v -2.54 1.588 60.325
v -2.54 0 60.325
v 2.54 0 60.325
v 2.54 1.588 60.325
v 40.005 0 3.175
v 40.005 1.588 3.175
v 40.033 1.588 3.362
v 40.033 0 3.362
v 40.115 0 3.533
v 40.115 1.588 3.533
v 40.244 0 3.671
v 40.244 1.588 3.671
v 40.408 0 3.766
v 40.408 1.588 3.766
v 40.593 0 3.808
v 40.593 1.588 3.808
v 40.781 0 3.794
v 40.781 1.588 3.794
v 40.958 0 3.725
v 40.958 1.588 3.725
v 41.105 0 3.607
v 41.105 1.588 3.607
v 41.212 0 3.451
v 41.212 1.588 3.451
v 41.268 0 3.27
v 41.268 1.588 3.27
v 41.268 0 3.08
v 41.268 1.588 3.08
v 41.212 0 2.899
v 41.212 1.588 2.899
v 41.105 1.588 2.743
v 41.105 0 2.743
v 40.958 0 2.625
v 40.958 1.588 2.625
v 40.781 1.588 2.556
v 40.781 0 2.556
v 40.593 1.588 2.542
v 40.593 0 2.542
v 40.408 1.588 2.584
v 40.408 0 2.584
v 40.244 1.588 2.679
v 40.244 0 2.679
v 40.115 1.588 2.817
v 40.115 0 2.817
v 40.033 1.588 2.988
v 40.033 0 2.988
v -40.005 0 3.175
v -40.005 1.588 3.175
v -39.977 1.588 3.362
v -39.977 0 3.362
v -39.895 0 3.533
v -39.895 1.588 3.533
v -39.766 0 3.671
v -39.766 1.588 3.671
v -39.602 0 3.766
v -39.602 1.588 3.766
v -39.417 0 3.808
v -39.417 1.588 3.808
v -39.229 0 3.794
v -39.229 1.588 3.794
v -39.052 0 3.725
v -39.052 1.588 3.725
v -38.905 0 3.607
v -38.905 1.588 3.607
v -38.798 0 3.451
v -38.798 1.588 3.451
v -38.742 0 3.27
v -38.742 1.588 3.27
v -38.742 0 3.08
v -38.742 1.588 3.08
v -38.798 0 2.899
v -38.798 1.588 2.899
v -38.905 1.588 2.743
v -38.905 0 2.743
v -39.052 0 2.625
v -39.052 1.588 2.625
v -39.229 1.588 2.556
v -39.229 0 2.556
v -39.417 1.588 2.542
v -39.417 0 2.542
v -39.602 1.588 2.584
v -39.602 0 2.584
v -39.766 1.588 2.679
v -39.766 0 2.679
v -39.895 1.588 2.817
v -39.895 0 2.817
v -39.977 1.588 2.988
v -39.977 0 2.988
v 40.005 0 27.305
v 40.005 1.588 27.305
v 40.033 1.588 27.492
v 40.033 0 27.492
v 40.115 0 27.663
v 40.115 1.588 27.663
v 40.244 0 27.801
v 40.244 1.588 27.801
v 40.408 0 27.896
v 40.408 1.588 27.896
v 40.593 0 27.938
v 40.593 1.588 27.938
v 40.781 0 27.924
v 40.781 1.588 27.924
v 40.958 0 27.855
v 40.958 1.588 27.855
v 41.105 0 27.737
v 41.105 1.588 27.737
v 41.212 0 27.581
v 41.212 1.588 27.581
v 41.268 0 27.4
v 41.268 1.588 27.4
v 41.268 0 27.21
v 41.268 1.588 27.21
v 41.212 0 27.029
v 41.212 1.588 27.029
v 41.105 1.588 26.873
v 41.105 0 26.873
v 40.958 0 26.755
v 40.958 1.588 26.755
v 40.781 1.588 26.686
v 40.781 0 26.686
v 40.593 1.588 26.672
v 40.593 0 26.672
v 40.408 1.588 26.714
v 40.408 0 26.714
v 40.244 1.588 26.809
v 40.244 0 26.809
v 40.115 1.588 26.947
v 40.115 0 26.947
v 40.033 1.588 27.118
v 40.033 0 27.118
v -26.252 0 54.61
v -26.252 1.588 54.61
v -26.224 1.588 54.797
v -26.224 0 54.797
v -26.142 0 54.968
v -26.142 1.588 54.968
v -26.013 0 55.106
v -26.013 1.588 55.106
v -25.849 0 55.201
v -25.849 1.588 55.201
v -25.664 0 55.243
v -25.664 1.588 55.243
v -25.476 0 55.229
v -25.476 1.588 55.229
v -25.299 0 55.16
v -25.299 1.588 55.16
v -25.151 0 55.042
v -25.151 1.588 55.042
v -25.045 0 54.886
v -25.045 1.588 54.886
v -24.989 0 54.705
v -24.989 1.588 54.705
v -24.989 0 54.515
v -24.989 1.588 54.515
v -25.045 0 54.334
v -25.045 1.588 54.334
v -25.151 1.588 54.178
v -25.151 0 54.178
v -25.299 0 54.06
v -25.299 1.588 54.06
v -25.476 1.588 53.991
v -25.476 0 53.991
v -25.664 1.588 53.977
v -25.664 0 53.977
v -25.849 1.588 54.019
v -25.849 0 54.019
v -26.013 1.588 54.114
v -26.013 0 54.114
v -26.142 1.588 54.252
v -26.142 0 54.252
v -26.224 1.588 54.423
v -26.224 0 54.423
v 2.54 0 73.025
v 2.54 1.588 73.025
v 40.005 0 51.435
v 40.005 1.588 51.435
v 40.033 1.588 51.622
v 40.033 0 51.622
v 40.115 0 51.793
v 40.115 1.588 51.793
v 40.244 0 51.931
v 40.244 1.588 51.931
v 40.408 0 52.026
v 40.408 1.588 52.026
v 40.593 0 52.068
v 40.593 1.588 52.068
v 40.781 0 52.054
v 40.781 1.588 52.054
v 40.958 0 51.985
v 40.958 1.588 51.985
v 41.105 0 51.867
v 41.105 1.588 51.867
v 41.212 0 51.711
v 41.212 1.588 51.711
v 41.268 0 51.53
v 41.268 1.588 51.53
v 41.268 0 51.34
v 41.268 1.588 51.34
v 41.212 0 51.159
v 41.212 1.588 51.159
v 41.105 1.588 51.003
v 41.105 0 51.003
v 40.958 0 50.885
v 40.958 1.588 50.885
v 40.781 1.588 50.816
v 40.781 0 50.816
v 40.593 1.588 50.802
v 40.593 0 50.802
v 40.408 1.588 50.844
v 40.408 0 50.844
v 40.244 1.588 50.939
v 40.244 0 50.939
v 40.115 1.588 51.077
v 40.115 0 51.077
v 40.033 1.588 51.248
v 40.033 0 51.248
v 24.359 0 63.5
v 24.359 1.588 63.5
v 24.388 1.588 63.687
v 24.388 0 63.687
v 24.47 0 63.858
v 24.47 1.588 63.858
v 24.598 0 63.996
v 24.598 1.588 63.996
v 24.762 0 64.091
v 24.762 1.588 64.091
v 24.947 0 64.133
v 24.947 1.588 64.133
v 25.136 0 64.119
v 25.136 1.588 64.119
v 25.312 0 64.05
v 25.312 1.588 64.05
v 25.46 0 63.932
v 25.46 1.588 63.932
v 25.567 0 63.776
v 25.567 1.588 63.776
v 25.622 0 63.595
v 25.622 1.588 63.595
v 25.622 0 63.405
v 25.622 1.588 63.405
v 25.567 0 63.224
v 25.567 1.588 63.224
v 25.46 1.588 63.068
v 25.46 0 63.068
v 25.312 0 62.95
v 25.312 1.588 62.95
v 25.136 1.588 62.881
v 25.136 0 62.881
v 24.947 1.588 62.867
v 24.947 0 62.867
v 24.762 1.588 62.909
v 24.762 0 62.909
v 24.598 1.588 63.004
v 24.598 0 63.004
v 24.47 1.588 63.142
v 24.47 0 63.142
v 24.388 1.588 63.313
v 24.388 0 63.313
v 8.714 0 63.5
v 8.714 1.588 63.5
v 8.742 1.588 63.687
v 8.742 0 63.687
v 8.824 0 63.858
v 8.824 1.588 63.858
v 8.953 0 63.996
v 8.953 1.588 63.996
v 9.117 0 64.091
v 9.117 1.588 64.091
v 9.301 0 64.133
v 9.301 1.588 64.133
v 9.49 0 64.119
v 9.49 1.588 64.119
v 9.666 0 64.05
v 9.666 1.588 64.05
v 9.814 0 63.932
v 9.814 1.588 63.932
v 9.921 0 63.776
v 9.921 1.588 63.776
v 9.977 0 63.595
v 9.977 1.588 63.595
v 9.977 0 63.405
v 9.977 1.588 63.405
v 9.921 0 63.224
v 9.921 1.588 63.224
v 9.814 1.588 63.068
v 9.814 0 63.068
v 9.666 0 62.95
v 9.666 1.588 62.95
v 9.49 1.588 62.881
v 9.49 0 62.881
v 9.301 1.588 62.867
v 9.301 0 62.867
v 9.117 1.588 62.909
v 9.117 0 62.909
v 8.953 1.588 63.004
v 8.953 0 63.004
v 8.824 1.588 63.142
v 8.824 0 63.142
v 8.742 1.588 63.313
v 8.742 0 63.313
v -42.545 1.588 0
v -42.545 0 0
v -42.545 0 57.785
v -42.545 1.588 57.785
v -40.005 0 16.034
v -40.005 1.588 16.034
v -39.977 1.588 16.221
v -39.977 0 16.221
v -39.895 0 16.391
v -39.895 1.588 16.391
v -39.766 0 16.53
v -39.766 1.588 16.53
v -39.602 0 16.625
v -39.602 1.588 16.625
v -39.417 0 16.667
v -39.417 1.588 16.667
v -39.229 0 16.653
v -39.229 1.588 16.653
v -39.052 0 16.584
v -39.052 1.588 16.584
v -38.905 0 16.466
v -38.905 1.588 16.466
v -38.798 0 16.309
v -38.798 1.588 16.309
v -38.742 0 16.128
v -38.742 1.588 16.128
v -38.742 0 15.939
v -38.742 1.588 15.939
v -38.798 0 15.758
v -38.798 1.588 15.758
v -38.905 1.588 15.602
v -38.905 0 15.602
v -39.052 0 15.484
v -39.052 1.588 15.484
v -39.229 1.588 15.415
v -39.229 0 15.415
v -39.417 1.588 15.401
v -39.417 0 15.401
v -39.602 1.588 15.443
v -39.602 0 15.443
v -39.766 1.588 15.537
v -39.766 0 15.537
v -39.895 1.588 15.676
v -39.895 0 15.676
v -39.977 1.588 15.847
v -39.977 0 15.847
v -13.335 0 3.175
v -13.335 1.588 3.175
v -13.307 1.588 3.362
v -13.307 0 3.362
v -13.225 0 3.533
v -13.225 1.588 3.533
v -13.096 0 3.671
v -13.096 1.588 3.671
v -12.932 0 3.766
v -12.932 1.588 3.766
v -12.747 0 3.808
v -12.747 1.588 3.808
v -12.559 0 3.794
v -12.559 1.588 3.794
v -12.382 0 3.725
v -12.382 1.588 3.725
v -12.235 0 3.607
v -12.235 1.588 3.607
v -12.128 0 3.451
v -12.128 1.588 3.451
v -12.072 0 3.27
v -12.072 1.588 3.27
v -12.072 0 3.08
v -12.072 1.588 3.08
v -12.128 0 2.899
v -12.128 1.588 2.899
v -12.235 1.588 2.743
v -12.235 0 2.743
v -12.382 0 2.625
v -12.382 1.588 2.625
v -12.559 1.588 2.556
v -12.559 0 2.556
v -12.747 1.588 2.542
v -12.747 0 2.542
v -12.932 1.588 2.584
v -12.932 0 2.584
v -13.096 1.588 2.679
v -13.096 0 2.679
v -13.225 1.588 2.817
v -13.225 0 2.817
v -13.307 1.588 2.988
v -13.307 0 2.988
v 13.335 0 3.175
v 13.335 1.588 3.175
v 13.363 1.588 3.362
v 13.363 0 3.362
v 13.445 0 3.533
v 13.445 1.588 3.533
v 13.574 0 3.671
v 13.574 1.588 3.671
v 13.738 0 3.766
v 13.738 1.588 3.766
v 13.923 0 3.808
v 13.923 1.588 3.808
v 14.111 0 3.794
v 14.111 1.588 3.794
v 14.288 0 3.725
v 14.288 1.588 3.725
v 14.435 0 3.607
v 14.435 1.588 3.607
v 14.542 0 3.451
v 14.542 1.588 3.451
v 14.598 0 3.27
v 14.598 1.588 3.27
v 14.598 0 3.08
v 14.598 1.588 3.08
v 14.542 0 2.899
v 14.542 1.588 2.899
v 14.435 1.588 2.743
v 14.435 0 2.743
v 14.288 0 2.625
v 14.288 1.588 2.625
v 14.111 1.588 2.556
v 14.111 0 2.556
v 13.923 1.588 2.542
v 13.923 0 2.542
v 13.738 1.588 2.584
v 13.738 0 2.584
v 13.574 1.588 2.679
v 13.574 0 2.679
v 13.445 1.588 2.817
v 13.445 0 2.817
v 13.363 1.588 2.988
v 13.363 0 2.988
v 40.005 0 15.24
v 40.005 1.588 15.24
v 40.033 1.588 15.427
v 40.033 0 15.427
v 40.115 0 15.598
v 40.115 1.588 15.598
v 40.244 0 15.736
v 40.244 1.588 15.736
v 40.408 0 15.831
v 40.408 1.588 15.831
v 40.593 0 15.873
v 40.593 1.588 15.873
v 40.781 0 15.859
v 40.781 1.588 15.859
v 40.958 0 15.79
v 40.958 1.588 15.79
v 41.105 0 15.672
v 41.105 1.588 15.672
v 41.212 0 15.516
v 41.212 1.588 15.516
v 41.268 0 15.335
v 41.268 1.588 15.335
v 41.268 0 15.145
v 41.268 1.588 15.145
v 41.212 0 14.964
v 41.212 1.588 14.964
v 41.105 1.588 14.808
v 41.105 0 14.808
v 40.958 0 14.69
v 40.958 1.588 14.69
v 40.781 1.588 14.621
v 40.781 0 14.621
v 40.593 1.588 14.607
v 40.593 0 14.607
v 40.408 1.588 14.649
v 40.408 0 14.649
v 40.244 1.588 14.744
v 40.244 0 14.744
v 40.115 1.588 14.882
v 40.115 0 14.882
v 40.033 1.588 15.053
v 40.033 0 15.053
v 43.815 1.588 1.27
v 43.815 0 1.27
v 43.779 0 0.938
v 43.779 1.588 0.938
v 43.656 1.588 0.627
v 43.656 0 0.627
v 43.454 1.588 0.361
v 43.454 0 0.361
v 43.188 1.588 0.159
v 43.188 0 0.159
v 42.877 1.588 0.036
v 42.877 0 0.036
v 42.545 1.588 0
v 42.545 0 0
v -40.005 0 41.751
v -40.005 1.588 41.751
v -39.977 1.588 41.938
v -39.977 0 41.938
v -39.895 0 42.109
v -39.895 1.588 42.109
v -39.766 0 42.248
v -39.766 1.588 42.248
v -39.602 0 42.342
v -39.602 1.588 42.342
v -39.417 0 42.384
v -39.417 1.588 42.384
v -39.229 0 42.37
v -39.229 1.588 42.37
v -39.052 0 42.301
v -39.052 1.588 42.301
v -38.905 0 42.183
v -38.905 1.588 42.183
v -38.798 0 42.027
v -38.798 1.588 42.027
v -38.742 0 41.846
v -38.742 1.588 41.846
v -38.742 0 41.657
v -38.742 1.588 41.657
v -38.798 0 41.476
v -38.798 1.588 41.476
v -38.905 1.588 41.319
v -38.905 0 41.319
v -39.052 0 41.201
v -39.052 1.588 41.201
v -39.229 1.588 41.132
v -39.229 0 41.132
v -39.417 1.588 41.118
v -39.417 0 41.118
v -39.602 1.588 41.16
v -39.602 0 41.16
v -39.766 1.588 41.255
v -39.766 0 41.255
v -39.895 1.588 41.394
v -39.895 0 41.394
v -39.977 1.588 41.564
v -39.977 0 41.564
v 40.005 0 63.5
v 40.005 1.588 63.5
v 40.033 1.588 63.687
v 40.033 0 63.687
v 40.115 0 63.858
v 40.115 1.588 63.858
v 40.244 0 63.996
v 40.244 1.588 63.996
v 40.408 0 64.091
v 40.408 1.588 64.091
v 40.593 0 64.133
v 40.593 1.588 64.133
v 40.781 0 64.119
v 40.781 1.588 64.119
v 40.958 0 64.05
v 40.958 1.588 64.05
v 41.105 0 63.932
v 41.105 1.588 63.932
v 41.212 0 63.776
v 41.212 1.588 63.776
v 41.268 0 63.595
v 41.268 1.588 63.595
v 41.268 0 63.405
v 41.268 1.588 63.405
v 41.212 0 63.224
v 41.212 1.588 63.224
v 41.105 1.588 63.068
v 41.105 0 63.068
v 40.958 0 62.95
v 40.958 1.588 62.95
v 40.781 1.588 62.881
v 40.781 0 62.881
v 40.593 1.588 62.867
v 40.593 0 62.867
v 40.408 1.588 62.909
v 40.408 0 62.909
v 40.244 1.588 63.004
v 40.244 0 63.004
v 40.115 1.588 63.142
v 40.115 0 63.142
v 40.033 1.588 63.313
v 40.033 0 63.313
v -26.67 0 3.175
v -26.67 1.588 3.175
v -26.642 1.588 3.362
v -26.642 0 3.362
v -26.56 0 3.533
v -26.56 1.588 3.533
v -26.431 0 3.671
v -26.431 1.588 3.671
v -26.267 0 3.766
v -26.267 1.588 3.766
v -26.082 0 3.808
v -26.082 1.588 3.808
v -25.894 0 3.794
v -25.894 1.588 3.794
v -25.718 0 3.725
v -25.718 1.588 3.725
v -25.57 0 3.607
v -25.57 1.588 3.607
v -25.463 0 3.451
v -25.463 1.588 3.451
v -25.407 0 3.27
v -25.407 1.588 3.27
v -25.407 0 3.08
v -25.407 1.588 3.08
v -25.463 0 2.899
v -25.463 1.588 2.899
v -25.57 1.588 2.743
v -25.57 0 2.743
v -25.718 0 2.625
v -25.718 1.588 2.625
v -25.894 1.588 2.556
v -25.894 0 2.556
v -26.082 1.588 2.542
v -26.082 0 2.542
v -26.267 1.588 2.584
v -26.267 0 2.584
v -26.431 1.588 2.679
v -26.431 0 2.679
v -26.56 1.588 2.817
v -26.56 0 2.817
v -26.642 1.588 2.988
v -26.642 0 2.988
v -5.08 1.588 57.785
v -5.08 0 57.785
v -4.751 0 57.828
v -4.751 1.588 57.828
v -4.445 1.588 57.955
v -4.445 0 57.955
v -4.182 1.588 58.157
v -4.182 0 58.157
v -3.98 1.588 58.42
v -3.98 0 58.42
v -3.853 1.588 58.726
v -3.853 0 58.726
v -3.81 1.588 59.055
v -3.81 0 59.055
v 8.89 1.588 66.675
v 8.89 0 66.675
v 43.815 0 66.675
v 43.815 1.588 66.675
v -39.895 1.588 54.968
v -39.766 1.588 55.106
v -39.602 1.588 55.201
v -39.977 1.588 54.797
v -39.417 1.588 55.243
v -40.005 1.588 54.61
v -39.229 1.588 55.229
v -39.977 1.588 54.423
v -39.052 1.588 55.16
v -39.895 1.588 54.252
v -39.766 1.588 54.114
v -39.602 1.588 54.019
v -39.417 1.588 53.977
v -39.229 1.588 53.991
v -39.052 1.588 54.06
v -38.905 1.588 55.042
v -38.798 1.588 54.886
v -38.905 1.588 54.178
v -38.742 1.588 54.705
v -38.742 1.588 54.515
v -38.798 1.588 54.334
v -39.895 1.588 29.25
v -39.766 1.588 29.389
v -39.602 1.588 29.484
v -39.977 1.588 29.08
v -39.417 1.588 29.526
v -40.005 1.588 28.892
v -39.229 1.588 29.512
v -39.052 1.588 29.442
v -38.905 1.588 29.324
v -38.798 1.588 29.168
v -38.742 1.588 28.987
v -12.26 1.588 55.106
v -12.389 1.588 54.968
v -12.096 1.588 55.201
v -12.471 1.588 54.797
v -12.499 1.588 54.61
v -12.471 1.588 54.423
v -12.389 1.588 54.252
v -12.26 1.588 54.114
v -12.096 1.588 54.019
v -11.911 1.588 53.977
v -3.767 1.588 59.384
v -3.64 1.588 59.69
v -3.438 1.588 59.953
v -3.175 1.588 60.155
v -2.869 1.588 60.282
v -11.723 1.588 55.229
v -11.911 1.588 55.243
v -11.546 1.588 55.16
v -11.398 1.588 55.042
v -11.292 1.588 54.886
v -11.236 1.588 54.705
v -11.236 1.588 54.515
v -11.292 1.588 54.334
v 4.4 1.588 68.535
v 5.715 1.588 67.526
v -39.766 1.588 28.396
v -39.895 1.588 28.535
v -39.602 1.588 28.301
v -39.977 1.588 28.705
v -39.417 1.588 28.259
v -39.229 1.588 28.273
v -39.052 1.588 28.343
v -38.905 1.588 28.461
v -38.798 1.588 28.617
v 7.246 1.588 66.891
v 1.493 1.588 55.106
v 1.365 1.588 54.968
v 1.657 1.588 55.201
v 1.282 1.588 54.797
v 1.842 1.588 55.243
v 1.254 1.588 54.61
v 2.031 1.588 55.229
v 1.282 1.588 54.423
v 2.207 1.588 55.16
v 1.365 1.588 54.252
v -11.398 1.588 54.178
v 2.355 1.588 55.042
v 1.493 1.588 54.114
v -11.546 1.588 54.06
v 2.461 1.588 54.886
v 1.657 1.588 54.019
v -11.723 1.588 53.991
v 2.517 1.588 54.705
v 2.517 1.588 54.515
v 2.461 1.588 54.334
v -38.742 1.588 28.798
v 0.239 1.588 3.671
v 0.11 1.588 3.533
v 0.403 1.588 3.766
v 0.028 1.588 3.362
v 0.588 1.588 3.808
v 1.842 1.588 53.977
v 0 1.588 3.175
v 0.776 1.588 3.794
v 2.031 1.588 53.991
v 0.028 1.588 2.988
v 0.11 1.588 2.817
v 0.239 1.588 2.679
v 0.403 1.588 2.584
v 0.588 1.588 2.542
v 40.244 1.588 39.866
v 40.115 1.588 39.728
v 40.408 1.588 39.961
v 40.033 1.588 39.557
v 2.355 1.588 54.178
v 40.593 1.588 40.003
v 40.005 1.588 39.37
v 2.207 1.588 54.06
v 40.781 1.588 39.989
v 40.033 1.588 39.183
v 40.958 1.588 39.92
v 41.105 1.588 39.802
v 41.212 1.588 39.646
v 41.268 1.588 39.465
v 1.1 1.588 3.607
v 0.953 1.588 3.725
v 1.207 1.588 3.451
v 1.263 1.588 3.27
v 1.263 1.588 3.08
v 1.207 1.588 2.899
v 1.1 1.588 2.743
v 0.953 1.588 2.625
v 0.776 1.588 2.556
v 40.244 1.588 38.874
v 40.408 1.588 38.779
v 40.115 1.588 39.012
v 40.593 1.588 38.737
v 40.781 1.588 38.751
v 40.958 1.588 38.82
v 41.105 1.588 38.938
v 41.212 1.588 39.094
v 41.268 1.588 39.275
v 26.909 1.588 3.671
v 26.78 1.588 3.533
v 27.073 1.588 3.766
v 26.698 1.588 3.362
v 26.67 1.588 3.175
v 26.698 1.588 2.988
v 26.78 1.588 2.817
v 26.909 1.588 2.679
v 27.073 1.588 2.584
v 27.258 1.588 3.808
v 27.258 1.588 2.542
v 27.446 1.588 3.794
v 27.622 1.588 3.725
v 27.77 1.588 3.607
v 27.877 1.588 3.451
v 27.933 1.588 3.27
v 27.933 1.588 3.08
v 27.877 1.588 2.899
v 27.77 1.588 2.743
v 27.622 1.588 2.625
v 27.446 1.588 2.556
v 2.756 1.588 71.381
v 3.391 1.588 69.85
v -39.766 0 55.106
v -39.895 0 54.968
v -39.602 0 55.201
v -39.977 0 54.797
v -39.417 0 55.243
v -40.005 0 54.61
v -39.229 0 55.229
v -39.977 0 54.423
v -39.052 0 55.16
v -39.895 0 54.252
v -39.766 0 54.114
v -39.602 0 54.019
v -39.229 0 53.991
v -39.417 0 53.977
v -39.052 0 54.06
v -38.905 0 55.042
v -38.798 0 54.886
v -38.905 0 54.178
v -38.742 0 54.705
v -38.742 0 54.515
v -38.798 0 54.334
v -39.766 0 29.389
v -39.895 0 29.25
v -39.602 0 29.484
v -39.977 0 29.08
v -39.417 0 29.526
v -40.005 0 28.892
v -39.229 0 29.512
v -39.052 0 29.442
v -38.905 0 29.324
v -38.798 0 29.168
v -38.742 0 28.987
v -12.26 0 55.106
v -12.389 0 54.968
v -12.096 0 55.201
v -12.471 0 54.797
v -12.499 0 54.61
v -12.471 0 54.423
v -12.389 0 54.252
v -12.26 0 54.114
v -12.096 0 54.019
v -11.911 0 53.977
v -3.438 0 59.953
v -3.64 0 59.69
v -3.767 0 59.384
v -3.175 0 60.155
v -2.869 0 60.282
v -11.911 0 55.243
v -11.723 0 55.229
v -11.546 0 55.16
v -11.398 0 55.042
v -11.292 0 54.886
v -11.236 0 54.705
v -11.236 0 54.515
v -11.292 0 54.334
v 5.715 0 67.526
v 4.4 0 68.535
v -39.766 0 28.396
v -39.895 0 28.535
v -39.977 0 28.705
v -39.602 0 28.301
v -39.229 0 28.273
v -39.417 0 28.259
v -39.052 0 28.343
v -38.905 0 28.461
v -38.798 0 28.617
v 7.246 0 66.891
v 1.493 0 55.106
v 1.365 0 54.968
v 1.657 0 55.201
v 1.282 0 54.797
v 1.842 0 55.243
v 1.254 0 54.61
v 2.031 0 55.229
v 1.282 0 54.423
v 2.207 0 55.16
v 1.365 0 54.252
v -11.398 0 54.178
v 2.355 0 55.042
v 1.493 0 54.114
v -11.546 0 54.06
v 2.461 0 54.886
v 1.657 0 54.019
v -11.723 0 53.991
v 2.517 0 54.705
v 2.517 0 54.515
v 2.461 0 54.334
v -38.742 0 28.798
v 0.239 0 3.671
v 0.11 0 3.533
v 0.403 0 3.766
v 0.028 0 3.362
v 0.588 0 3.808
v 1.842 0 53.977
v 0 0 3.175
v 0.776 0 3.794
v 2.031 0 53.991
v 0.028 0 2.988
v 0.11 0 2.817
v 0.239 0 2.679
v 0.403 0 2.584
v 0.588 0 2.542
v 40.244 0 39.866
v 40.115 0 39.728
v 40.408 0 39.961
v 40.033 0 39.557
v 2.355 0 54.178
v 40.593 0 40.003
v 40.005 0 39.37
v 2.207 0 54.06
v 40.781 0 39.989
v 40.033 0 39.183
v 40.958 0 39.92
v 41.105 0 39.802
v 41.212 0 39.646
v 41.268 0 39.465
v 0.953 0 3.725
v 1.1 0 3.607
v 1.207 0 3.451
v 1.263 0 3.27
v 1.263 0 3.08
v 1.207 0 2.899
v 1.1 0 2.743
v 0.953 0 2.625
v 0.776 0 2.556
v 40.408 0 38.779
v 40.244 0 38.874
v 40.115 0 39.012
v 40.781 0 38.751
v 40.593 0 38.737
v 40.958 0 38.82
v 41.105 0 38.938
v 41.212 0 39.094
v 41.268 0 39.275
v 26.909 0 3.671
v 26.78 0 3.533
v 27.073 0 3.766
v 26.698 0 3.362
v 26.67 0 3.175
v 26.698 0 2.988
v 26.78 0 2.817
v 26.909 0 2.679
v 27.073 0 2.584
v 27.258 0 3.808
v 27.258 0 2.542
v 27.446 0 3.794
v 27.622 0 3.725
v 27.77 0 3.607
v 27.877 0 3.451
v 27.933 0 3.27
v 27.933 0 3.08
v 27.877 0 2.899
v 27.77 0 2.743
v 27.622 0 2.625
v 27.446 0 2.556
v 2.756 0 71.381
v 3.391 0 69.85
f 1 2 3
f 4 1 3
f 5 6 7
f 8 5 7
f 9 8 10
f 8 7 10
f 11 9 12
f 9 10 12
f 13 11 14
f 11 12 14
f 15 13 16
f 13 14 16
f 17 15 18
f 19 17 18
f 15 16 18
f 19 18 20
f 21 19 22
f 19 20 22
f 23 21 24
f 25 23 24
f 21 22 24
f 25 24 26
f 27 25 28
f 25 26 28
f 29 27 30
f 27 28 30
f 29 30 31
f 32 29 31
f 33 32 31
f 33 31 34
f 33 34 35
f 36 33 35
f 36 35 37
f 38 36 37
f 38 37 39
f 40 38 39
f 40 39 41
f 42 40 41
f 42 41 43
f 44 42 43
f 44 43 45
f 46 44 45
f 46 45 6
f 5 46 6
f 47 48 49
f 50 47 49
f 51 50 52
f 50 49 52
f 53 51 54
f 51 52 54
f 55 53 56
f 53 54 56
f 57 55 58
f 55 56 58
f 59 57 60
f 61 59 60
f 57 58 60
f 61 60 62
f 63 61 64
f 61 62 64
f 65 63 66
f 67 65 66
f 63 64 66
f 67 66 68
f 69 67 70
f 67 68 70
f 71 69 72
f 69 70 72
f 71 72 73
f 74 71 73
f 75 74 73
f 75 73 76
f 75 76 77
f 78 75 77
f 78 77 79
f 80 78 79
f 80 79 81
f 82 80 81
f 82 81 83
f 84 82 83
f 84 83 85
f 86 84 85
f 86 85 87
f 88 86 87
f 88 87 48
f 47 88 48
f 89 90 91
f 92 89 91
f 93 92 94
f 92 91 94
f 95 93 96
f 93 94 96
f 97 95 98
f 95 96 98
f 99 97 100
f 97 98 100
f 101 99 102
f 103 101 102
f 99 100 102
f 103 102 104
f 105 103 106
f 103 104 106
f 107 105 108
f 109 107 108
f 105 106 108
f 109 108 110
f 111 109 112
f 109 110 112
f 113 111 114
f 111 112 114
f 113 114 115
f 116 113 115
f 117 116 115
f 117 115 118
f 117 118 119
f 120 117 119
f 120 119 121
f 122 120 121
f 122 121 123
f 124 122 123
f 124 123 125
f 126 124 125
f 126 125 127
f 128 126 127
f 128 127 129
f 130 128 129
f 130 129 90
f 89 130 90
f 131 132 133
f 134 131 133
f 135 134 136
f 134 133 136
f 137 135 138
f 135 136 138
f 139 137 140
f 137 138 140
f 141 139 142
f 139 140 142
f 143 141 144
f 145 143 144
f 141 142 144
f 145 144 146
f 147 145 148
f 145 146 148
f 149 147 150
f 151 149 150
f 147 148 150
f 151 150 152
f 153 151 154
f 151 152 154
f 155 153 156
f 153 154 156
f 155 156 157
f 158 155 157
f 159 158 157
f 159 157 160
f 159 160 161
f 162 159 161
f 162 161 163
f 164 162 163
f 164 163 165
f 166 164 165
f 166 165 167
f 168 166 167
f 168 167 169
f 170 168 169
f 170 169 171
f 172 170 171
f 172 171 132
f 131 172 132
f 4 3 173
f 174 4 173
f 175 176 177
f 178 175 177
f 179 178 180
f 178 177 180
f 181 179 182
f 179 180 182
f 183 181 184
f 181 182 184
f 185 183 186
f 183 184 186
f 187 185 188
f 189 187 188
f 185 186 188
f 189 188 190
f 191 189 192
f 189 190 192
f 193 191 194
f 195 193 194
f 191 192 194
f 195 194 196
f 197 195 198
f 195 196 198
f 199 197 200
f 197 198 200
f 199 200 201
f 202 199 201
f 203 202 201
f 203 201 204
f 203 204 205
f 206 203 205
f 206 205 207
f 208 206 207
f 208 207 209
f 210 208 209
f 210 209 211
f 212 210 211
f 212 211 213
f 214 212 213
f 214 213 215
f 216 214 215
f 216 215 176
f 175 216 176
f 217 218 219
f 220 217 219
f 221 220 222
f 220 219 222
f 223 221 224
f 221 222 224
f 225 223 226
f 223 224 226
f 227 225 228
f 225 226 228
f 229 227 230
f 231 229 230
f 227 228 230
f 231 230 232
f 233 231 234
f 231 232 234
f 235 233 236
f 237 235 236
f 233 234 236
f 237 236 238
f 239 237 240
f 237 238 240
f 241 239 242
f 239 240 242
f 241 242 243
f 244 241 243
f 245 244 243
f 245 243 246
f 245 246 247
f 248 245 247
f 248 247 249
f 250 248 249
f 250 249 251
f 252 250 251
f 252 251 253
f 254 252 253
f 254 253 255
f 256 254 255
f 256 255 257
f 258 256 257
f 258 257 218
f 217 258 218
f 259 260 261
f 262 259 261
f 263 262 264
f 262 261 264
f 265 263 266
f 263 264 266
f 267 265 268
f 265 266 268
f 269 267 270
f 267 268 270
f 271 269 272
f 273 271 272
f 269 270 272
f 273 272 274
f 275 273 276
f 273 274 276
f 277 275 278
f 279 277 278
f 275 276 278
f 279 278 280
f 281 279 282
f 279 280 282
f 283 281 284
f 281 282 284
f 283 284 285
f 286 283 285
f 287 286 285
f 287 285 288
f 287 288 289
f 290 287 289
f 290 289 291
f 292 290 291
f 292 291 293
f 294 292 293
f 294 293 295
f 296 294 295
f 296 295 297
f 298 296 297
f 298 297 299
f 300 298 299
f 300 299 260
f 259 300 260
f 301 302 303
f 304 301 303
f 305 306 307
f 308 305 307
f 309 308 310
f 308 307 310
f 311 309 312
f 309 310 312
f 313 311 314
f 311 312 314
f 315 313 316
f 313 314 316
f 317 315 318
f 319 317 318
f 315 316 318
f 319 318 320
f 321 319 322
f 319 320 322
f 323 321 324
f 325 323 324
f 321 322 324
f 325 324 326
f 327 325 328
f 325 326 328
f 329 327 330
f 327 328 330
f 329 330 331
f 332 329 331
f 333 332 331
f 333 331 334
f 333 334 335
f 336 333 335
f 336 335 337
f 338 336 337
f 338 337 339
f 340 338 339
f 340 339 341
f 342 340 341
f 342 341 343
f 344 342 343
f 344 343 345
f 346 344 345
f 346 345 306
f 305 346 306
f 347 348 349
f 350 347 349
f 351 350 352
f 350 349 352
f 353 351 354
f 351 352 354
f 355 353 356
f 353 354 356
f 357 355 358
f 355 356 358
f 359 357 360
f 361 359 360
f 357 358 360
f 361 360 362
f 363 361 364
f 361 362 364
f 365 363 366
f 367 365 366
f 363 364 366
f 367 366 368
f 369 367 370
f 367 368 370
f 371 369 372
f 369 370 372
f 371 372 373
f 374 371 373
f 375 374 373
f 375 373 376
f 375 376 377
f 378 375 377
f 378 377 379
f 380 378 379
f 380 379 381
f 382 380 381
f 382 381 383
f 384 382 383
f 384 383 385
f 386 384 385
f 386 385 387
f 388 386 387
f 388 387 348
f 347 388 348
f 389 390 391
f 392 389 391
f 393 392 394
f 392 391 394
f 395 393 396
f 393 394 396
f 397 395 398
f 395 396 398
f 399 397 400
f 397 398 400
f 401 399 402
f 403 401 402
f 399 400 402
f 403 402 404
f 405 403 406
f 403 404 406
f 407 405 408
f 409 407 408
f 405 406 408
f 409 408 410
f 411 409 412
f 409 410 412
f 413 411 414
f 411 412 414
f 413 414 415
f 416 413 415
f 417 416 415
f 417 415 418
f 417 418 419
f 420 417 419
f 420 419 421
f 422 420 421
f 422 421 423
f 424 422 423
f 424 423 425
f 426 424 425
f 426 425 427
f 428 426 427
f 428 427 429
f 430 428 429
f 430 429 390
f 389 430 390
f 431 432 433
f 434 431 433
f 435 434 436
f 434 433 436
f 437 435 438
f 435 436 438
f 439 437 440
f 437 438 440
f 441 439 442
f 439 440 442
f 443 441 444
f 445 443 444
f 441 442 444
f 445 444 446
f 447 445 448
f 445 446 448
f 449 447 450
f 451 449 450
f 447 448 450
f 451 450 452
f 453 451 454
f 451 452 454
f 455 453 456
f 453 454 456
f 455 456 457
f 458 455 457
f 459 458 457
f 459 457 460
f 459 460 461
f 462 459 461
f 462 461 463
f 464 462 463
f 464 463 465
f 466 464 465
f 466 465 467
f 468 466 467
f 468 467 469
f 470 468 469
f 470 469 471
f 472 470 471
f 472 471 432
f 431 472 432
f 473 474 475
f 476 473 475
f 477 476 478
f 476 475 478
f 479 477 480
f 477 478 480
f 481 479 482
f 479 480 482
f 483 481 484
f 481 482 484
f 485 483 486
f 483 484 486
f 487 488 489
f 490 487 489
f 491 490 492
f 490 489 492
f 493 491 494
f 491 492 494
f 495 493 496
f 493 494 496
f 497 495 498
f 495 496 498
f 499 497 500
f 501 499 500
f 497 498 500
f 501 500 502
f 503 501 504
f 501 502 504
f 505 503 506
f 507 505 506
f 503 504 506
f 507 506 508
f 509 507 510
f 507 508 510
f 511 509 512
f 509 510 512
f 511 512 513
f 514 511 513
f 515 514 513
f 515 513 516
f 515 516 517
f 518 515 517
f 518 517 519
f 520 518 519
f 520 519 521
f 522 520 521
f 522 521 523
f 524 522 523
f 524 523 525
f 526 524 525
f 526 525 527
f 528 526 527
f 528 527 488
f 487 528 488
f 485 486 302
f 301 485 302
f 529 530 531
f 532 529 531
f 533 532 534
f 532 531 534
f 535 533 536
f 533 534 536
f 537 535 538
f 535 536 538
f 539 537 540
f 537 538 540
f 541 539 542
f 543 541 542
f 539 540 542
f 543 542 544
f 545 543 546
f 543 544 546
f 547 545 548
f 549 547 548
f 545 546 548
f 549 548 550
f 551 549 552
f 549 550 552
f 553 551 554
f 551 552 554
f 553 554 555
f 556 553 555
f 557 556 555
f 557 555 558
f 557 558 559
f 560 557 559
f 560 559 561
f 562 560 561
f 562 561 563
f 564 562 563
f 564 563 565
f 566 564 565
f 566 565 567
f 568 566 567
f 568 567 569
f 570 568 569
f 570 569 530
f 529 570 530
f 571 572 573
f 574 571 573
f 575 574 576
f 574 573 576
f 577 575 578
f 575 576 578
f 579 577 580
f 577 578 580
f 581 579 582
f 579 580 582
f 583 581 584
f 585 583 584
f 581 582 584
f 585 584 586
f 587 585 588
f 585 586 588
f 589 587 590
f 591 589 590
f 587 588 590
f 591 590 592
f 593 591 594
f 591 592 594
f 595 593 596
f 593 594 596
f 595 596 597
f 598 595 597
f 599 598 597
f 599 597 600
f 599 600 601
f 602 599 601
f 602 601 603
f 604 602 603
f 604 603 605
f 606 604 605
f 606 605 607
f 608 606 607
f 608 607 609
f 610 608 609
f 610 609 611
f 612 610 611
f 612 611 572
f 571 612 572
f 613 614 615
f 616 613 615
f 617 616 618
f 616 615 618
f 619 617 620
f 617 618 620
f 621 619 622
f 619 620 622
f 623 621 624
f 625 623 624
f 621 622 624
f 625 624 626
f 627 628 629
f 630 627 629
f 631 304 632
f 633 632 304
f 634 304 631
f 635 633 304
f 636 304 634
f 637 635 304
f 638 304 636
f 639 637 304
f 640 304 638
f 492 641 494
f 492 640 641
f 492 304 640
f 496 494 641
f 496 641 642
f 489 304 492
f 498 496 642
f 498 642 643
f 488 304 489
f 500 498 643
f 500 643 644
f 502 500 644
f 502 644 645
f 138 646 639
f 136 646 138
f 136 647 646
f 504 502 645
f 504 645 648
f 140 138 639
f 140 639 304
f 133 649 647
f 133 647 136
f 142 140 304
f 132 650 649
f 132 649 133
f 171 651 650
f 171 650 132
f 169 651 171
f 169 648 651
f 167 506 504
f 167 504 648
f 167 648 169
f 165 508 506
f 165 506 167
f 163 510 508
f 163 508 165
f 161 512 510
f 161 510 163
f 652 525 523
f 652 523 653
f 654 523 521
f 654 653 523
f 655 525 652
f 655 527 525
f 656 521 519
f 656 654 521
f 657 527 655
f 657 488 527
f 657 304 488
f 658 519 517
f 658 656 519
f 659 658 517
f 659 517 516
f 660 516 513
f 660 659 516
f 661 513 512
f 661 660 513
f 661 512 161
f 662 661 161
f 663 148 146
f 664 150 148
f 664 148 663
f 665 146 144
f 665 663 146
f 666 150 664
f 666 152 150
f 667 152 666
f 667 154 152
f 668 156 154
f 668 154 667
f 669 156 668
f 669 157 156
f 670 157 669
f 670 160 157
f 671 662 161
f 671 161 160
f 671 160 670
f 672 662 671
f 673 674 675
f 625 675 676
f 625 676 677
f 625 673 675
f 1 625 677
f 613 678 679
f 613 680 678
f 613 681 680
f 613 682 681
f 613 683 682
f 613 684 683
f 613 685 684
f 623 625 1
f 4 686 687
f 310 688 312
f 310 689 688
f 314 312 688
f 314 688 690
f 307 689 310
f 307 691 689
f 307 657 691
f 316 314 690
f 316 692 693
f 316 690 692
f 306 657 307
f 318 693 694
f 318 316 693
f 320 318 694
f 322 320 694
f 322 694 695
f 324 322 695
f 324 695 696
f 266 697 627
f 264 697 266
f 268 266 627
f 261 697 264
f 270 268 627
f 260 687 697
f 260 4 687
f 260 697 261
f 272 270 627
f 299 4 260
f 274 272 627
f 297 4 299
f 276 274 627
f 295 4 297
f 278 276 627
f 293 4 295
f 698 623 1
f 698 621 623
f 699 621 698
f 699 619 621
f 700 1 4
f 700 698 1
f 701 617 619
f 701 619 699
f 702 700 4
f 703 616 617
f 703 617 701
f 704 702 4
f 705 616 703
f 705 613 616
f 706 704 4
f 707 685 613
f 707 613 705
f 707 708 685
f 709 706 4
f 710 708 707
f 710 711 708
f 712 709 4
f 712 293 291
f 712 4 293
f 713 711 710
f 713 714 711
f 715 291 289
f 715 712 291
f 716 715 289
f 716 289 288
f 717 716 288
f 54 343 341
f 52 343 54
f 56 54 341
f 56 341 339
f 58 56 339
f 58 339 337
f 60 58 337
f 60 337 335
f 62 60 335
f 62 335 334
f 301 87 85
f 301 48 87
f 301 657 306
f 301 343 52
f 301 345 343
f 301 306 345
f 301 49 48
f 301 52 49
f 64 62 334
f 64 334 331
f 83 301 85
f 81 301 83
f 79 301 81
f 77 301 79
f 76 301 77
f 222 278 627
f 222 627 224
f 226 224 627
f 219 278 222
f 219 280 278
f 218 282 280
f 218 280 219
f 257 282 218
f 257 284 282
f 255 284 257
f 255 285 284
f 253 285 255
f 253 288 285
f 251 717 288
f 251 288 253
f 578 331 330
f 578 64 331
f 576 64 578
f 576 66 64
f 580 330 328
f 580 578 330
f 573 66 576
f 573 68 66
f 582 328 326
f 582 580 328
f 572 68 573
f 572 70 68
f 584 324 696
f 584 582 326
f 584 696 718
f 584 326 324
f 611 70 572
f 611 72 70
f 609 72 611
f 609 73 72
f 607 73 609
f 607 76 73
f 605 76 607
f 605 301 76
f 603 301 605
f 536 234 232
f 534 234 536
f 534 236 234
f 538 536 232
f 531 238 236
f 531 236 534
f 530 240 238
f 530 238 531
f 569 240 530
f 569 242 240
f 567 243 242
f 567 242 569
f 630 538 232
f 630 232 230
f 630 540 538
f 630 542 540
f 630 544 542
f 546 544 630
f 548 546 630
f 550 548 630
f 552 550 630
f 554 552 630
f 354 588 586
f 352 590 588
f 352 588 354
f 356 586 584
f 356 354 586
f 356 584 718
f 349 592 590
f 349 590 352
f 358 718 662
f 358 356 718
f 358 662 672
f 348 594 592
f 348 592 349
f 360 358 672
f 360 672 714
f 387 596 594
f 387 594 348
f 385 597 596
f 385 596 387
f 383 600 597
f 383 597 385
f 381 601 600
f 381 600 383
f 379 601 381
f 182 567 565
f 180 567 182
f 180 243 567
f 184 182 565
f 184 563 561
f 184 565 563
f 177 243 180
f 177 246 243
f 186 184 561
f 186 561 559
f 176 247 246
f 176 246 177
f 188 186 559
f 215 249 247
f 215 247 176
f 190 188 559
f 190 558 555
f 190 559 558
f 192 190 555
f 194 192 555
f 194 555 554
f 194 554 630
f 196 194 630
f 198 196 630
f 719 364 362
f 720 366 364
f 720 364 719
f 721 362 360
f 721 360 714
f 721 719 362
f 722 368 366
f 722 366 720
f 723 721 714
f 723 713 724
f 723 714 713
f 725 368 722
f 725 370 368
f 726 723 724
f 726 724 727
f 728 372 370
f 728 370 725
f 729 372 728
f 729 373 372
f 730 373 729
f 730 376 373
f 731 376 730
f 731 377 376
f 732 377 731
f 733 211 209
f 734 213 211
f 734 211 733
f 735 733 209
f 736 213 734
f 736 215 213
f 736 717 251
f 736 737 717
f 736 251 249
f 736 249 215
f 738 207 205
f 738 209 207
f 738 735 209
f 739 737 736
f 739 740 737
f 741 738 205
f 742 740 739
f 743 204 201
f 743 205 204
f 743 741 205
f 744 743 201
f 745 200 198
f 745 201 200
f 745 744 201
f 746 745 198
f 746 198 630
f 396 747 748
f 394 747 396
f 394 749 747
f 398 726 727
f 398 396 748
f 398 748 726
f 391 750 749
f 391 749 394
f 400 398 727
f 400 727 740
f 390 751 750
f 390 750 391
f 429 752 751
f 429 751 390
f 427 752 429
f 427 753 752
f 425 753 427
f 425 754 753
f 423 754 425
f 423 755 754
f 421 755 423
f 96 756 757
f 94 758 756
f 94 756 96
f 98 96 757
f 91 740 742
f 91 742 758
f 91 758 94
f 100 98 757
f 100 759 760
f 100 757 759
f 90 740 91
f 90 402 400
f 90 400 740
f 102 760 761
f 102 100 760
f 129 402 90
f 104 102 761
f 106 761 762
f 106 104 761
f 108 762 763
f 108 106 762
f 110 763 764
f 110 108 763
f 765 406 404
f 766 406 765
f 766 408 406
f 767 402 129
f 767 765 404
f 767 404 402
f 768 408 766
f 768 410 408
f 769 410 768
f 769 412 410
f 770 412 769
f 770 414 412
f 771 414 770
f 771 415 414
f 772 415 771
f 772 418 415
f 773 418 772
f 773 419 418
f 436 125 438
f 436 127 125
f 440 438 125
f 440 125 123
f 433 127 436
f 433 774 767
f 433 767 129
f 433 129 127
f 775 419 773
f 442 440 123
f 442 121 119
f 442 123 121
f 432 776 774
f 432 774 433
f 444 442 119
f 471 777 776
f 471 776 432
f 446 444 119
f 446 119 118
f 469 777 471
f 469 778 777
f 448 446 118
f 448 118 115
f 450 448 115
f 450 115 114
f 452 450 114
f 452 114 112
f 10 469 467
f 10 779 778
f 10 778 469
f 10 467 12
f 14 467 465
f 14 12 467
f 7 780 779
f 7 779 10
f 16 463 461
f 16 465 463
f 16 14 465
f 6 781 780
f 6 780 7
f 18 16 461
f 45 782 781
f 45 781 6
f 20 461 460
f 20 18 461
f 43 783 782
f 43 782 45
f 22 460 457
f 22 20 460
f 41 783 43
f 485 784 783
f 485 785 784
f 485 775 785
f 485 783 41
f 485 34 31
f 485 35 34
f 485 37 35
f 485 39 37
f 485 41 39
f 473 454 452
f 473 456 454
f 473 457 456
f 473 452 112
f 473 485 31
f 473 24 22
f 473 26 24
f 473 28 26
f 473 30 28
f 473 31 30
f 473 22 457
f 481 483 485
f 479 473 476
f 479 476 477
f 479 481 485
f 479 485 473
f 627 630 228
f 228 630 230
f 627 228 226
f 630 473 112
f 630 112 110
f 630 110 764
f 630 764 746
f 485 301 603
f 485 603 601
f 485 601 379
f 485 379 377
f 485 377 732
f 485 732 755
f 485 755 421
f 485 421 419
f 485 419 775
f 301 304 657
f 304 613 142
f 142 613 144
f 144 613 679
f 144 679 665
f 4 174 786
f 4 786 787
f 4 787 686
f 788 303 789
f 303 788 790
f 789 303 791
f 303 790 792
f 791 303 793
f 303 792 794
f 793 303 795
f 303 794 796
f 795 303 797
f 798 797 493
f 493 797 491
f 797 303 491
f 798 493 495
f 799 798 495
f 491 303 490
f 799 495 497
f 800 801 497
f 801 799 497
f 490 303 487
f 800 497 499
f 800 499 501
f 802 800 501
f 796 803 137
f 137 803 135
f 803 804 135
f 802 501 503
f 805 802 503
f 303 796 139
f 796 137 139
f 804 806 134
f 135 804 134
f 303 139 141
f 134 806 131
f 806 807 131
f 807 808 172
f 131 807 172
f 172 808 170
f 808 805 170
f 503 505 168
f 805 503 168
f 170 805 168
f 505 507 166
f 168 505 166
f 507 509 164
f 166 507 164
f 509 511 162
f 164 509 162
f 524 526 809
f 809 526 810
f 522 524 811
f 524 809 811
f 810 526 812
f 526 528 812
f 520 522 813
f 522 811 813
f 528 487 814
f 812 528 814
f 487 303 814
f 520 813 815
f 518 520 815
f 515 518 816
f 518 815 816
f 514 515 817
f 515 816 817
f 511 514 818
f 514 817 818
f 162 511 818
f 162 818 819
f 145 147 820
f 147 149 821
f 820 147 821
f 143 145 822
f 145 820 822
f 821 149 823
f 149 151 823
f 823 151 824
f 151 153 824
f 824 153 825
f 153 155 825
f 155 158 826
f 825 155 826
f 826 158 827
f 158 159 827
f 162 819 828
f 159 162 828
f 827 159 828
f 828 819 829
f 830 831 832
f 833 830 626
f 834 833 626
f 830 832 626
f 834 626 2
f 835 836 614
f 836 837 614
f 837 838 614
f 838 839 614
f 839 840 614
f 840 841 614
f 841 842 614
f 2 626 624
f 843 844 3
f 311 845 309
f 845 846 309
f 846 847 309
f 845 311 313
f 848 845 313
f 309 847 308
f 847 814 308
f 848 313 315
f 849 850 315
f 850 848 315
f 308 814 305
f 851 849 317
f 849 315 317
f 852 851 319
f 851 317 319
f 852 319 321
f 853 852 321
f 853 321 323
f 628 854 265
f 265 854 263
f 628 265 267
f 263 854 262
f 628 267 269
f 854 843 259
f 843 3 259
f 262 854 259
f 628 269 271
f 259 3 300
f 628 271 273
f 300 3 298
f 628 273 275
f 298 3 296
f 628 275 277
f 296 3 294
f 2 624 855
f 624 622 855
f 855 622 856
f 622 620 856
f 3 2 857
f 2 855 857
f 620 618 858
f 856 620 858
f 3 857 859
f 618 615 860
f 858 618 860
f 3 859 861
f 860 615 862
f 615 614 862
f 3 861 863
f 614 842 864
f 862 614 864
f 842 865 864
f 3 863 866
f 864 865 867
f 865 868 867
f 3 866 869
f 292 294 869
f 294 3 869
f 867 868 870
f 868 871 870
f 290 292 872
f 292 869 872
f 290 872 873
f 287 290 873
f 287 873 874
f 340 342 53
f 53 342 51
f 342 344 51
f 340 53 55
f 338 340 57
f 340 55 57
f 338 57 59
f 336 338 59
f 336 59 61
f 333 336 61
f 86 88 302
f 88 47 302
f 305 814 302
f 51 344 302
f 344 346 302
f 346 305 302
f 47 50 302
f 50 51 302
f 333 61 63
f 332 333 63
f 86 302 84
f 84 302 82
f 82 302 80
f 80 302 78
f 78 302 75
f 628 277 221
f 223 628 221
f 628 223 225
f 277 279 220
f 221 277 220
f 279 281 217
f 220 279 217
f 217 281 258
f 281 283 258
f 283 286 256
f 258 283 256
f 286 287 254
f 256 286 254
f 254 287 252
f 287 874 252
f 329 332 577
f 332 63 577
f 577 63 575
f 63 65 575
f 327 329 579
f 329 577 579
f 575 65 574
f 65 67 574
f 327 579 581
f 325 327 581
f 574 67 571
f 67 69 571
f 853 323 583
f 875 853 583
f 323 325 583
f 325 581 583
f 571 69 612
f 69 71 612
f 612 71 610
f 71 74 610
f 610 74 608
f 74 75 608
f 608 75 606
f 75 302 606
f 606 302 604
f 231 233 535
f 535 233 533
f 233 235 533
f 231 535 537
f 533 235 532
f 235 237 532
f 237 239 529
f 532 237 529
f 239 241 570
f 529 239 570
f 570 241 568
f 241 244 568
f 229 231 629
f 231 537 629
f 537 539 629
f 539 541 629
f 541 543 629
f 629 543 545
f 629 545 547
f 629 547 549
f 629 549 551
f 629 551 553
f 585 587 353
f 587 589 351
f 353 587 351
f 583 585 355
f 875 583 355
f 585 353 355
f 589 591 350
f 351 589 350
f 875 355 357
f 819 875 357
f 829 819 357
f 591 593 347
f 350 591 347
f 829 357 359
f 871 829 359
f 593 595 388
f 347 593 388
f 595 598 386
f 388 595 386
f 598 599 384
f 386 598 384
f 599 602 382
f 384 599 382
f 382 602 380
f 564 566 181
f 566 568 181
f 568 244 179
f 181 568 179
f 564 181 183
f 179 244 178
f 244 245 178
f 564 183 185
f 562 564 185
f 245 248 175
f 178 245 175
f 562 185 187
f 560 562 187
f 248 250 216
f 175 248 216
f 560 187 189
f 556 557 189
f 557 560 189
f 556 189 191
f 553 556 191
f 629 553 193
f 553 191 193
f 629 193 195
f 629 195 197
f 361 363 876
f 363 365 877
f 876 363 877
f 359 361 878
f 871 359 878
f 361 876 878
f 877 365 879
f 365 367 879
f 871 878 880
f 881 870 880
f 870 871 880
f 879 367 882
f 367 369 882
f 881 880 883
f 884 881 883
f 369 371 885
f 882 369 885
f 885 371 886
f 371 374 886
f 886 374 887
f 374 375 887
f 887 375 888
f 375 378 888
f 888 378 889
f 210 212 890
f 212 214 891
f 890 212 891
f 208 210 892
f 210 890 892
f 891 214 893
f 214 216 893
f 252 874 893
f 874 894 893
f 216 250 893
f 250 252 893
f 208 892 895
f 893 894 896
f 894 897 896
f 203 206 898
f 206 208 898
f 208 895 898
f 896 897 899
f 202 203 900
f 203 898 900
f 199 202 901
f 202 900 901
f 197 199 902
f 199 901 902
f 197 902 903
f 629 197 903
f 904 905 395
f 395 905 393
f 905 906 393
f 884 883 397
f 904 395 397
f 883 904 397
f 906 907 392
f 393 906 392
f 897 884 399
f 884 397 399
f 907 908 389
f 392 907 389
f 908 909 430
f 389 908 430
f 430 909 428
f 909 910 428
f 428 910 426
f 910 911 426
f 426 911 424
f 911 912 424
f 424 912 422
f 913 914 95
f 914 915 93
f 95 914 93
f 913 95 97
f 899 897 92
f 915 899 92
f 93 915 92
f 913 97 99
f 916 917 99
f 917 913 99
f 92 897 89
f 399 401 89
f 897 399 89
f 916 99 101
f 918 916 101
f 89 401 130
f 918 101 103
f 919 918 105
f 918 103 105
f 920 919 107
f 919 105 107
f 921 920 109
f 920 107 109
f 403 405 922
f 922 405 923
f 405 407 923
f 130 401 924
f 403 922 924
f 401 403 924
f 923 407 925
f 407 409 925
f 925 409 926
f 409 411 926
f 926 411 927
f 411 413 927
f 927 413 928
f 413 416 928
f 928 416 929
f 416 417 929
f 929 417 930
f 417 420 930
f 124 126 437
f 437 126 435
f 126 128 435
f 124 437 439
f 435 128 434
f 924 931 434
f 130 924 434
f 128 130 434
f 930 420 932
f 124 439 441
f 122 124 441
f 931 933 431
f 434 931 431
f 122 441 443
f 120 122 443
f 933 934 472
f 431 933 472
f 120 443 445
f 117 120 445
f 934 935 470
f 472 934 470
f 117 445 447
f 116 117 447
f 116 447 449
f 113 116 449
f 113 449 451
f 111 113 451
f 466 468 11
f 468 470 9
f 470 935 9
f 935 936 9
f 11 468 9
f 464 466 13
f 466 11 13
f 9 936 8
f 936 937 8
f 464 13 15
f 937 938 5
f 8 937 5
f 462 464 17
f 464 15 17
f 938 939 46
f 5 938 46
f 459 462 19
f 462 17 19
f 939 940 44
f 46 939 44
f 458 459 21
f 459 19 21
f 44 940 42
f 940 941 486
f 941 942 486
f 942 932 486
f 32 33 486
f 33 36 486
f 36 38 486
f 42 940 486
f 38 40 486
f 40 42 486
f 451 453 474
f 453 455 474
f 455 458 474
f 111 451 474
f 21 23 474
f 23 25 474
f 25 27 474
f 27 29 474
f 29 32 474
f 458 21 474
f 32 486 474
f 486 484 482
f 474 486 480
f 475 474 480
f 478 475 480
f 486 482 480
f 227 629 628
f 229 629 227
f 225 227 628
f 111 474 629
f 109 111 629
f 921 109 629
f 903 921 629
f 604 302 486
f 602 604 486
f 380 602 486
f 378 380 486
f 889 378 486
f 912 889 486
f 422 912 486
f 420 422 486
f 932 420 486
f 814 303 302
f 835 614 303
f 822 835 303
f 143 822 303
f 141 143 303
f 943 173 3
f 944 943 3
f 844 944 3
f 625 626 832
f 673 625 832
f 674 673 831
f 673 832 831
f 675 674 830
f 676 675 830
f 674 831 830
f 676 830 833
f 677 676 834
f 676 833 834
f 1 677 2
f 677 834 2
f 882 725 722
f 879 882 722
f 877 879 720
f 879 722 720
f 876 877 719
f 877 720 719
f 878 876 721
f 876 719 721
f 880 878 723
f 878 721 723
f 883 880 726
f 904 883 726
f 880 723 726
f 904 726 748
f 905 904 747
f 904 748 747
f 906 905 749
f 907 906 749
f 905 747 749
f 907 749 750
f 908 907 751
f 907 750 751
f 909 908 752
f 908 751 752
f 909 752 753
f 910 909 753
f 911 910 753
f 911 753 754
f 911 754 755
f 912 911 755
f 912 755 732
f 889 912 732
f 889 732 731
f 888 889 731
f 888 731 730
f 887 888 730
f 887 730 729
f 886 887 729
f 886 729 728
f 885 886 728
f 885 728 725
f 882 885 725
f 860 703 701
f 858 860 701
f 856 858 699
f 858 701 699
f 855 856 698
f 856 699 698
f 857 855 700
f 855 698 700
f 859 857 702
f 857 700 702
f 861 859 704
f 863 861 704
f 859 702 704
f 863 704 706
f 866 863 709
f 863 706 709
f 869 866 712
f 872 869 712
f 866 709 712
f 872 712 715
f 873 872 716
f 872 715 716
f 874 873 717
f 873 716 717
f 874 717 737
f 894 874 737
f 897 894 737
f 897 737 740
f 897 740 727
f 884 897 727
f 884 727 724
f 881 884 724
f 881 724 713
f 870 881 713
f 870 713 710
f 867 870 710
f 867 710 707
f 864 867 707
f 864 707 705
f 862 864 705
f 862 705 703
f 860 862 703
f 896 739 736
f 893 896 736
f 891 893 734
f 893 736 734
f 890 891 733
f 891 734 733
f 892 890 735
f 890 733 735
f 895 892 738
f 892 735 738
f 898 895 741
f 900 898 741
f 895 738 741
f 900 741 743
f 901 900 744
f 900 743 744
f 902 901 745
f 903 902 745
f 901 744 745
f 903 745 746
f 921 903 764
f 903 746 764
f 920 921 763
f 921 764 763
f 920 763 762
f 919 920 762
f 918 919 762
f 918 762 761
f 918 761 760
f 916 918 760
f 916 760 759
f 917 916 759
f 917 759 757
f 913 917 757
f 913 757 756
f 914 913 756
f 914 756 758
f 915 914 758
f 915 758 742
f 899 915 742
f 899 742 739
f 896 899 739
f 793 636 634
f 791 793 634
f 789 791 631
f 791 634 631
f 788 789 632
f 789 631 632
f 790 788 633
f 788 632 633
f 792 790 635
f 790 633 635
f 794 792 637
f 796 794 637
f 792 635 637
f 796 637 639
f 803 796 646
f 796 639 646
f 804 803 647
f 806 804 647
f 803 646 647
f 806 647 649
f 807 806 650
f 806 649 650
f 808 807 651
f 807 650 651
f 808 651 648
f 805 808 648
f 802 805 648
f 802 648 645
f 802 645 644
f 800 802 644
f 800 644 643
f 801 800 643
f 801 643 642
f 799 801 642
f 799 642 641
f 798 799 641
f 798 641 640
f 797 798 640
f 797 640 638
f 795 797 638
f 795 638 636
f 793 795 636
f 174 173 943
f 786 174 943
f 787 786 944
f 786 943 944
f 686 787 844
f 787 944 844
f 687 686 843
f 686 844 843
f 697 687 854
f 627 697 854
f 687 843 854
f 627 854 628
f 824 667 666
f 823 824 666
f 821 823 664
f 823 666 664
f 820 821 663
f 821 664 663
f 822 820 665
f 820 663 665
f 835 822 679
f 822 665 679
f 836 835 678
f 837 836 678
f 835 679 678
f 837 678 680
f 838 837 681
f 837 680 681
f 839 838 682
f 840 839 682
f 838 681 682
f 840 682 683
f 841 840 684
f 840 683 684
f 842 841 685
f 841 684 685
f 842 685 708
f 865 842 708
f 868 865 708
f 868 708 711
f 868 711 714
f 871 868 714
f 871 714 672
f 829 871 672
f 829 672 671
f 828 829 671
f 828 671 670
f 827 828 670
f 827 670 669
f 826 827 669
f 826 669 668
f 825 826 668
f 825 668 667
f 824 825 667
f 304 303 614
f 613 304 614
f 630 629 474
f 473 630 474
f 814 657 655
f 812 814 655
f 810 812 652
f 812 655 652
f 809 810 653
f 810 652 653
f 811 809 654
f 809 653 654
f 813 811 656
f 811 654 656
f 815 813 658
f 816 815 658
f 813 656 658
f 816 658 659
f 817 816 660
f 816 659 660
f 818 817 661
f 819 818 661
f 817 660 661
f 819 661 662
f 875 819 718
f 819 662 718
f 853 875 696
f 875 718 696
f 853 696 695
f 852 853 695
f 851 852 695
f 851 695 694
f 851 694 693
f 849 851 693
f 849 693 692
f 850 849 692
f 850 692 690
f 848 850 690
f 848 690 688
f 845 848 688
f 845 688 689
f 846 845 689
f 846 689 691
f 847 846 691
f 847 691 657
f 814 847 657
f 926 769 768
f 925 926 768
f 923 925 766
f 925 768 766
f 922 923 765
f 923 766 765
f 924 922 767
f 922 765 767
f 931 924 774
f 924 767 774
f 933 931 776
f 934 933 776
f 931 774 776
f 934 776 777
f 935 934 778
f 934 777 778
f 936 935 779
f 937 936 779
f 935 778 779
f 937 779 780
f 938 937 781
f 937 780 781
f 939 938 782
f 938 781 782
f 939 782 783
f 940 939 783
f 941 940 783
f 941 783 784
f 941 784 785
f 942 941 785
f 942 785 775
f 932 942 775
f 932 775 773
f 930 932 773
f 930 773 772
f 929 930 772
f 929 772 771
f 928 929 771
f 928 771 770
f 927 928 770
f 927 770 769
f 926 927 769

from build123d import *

# Parameters (mm, degrees)
BOSS_EXTRUDE1_DEPTH     = 1.5875
SKETCH2_R               = 0.635
CUT_EXTRUDE1_DEPTH      = 1
CUT_EXTRUDE1_DEPTH_BACK = 2.5875


with BuildPart() as part:
    # Sketch1 → Boss-Extrude1 (new body)
    with BuildSketch(Plane(origin=(0, 0, 0), x_dir=(1, 0, 0), z_dir=(0, 1, 0))):
        with BuildLine():
            Line((8.89, -66.675), (43.815, -66.675))
            Line((43.815, -66.675), (43.815, -1.27))
            ThreePointArc((43.815, -1.27), (43.453523156, -0.361476844), (42.545, 0))
            Line((42.545, 0), (-42.545, 0))
            Line((-42.545, 0), (-42.545, -57.785))
            Line((-42.545, -57.785), (-5.08, -57.785))
            ThreePointArc((-5.08, -57.785), (-4.181974388, -58.156974388), (-3.81, -59.055))
            ThreePointArc((-3.81, -59.055), (-3.438025612, -59.953025612), (-2.54, -60.325))
            Line((-2.54, -60.325), (2.54, -60.325))
            Line((2.54, -60.325), (2.54, -73.025))
            ThreePointArc((2.54, -73.025), (4.399871939, -68.534871939), (8.89, -66.675))
        make_face()
    extrude(amount=BOSS_EXTRUDE1_DEPTH)

    # Sketch2 → Cut-Extrude1 (cut, two sides)
    with BuildSketch(Plane(origin=(0, 1.5875, 0), x_dir=(-1, 0, 0), z_dir=(0, 1, 0))) as cut_extrude1_sk:
        with Locations((39.37, 3.175)):
            Circle(SKETCH2_R)
        with Locations((26.035, 3.175)):
            Circle(SKETCH2_R)
        with Locations((12.7, 3.175)):
            Circle(SKETCH2_R)
        with Locations((-0.635, 3.175)):
            Circle(SKETCH2_R)
        with Locations((-13.97, 3.175)):
            Circle(SKETCH2_R)
        with Locations((-27.305, 3.175)):
            Circle(SKETCH2_R)
        with Locations((-40.64, 3.175)):
            Circle(SKETCH2_R)
        with Locations((39.37, 16.03375)):
            Circle(SKETCH2_R)
        with Locations((39.37, 28.8925)):
            Circle(SKETCH2_R)
        with Locations((39.37, 41.75125)):
            Circle(SKETCH2_R)
        with Locations((-40.64, 15.24)):
            Circle(SKETCH2_R)
        with Locations((-40.64, 27.305)):
            Circle(SKETCH2_R)
        with Locations((-40.64, 39.37)):
            Circle(SKETCH2_R)
        with Locations((-40.64, 51.435)):
            Circle(SKETCH2_R)
        with Locations((-40.64, 63.5)):
            Circle(SKETCH2_R)
        with Locations((-24.994404736, 63.5)):
            Circle(SKETCH2_R)
        with Locations((-9.348809473, 63.5)):
            Circle(SKETCH2_R)
        with Locations((-1.889213751, 54.61)):
            Circle(SKETCH2_R)
        with Locations((11.863857499, 54.61)):
            Circle(SKETCH2_R)
        with Locations((25.61692875, 54.61)):
            Circle(SKETCH2_R)
        with Locations((39.37, 54.61)):
            Circle(SKETCH2_R)
    extrude(amount=CUT_EXTRUDE1_DEPTH, mode=Mode.SUBTRACT)
    extrude(cut_extrude1_sk.sketch, amount=-CUT_EXTRUDE1_DEPTH_BACK, mode=Mode.SUBTRACT)


solid = part.part
